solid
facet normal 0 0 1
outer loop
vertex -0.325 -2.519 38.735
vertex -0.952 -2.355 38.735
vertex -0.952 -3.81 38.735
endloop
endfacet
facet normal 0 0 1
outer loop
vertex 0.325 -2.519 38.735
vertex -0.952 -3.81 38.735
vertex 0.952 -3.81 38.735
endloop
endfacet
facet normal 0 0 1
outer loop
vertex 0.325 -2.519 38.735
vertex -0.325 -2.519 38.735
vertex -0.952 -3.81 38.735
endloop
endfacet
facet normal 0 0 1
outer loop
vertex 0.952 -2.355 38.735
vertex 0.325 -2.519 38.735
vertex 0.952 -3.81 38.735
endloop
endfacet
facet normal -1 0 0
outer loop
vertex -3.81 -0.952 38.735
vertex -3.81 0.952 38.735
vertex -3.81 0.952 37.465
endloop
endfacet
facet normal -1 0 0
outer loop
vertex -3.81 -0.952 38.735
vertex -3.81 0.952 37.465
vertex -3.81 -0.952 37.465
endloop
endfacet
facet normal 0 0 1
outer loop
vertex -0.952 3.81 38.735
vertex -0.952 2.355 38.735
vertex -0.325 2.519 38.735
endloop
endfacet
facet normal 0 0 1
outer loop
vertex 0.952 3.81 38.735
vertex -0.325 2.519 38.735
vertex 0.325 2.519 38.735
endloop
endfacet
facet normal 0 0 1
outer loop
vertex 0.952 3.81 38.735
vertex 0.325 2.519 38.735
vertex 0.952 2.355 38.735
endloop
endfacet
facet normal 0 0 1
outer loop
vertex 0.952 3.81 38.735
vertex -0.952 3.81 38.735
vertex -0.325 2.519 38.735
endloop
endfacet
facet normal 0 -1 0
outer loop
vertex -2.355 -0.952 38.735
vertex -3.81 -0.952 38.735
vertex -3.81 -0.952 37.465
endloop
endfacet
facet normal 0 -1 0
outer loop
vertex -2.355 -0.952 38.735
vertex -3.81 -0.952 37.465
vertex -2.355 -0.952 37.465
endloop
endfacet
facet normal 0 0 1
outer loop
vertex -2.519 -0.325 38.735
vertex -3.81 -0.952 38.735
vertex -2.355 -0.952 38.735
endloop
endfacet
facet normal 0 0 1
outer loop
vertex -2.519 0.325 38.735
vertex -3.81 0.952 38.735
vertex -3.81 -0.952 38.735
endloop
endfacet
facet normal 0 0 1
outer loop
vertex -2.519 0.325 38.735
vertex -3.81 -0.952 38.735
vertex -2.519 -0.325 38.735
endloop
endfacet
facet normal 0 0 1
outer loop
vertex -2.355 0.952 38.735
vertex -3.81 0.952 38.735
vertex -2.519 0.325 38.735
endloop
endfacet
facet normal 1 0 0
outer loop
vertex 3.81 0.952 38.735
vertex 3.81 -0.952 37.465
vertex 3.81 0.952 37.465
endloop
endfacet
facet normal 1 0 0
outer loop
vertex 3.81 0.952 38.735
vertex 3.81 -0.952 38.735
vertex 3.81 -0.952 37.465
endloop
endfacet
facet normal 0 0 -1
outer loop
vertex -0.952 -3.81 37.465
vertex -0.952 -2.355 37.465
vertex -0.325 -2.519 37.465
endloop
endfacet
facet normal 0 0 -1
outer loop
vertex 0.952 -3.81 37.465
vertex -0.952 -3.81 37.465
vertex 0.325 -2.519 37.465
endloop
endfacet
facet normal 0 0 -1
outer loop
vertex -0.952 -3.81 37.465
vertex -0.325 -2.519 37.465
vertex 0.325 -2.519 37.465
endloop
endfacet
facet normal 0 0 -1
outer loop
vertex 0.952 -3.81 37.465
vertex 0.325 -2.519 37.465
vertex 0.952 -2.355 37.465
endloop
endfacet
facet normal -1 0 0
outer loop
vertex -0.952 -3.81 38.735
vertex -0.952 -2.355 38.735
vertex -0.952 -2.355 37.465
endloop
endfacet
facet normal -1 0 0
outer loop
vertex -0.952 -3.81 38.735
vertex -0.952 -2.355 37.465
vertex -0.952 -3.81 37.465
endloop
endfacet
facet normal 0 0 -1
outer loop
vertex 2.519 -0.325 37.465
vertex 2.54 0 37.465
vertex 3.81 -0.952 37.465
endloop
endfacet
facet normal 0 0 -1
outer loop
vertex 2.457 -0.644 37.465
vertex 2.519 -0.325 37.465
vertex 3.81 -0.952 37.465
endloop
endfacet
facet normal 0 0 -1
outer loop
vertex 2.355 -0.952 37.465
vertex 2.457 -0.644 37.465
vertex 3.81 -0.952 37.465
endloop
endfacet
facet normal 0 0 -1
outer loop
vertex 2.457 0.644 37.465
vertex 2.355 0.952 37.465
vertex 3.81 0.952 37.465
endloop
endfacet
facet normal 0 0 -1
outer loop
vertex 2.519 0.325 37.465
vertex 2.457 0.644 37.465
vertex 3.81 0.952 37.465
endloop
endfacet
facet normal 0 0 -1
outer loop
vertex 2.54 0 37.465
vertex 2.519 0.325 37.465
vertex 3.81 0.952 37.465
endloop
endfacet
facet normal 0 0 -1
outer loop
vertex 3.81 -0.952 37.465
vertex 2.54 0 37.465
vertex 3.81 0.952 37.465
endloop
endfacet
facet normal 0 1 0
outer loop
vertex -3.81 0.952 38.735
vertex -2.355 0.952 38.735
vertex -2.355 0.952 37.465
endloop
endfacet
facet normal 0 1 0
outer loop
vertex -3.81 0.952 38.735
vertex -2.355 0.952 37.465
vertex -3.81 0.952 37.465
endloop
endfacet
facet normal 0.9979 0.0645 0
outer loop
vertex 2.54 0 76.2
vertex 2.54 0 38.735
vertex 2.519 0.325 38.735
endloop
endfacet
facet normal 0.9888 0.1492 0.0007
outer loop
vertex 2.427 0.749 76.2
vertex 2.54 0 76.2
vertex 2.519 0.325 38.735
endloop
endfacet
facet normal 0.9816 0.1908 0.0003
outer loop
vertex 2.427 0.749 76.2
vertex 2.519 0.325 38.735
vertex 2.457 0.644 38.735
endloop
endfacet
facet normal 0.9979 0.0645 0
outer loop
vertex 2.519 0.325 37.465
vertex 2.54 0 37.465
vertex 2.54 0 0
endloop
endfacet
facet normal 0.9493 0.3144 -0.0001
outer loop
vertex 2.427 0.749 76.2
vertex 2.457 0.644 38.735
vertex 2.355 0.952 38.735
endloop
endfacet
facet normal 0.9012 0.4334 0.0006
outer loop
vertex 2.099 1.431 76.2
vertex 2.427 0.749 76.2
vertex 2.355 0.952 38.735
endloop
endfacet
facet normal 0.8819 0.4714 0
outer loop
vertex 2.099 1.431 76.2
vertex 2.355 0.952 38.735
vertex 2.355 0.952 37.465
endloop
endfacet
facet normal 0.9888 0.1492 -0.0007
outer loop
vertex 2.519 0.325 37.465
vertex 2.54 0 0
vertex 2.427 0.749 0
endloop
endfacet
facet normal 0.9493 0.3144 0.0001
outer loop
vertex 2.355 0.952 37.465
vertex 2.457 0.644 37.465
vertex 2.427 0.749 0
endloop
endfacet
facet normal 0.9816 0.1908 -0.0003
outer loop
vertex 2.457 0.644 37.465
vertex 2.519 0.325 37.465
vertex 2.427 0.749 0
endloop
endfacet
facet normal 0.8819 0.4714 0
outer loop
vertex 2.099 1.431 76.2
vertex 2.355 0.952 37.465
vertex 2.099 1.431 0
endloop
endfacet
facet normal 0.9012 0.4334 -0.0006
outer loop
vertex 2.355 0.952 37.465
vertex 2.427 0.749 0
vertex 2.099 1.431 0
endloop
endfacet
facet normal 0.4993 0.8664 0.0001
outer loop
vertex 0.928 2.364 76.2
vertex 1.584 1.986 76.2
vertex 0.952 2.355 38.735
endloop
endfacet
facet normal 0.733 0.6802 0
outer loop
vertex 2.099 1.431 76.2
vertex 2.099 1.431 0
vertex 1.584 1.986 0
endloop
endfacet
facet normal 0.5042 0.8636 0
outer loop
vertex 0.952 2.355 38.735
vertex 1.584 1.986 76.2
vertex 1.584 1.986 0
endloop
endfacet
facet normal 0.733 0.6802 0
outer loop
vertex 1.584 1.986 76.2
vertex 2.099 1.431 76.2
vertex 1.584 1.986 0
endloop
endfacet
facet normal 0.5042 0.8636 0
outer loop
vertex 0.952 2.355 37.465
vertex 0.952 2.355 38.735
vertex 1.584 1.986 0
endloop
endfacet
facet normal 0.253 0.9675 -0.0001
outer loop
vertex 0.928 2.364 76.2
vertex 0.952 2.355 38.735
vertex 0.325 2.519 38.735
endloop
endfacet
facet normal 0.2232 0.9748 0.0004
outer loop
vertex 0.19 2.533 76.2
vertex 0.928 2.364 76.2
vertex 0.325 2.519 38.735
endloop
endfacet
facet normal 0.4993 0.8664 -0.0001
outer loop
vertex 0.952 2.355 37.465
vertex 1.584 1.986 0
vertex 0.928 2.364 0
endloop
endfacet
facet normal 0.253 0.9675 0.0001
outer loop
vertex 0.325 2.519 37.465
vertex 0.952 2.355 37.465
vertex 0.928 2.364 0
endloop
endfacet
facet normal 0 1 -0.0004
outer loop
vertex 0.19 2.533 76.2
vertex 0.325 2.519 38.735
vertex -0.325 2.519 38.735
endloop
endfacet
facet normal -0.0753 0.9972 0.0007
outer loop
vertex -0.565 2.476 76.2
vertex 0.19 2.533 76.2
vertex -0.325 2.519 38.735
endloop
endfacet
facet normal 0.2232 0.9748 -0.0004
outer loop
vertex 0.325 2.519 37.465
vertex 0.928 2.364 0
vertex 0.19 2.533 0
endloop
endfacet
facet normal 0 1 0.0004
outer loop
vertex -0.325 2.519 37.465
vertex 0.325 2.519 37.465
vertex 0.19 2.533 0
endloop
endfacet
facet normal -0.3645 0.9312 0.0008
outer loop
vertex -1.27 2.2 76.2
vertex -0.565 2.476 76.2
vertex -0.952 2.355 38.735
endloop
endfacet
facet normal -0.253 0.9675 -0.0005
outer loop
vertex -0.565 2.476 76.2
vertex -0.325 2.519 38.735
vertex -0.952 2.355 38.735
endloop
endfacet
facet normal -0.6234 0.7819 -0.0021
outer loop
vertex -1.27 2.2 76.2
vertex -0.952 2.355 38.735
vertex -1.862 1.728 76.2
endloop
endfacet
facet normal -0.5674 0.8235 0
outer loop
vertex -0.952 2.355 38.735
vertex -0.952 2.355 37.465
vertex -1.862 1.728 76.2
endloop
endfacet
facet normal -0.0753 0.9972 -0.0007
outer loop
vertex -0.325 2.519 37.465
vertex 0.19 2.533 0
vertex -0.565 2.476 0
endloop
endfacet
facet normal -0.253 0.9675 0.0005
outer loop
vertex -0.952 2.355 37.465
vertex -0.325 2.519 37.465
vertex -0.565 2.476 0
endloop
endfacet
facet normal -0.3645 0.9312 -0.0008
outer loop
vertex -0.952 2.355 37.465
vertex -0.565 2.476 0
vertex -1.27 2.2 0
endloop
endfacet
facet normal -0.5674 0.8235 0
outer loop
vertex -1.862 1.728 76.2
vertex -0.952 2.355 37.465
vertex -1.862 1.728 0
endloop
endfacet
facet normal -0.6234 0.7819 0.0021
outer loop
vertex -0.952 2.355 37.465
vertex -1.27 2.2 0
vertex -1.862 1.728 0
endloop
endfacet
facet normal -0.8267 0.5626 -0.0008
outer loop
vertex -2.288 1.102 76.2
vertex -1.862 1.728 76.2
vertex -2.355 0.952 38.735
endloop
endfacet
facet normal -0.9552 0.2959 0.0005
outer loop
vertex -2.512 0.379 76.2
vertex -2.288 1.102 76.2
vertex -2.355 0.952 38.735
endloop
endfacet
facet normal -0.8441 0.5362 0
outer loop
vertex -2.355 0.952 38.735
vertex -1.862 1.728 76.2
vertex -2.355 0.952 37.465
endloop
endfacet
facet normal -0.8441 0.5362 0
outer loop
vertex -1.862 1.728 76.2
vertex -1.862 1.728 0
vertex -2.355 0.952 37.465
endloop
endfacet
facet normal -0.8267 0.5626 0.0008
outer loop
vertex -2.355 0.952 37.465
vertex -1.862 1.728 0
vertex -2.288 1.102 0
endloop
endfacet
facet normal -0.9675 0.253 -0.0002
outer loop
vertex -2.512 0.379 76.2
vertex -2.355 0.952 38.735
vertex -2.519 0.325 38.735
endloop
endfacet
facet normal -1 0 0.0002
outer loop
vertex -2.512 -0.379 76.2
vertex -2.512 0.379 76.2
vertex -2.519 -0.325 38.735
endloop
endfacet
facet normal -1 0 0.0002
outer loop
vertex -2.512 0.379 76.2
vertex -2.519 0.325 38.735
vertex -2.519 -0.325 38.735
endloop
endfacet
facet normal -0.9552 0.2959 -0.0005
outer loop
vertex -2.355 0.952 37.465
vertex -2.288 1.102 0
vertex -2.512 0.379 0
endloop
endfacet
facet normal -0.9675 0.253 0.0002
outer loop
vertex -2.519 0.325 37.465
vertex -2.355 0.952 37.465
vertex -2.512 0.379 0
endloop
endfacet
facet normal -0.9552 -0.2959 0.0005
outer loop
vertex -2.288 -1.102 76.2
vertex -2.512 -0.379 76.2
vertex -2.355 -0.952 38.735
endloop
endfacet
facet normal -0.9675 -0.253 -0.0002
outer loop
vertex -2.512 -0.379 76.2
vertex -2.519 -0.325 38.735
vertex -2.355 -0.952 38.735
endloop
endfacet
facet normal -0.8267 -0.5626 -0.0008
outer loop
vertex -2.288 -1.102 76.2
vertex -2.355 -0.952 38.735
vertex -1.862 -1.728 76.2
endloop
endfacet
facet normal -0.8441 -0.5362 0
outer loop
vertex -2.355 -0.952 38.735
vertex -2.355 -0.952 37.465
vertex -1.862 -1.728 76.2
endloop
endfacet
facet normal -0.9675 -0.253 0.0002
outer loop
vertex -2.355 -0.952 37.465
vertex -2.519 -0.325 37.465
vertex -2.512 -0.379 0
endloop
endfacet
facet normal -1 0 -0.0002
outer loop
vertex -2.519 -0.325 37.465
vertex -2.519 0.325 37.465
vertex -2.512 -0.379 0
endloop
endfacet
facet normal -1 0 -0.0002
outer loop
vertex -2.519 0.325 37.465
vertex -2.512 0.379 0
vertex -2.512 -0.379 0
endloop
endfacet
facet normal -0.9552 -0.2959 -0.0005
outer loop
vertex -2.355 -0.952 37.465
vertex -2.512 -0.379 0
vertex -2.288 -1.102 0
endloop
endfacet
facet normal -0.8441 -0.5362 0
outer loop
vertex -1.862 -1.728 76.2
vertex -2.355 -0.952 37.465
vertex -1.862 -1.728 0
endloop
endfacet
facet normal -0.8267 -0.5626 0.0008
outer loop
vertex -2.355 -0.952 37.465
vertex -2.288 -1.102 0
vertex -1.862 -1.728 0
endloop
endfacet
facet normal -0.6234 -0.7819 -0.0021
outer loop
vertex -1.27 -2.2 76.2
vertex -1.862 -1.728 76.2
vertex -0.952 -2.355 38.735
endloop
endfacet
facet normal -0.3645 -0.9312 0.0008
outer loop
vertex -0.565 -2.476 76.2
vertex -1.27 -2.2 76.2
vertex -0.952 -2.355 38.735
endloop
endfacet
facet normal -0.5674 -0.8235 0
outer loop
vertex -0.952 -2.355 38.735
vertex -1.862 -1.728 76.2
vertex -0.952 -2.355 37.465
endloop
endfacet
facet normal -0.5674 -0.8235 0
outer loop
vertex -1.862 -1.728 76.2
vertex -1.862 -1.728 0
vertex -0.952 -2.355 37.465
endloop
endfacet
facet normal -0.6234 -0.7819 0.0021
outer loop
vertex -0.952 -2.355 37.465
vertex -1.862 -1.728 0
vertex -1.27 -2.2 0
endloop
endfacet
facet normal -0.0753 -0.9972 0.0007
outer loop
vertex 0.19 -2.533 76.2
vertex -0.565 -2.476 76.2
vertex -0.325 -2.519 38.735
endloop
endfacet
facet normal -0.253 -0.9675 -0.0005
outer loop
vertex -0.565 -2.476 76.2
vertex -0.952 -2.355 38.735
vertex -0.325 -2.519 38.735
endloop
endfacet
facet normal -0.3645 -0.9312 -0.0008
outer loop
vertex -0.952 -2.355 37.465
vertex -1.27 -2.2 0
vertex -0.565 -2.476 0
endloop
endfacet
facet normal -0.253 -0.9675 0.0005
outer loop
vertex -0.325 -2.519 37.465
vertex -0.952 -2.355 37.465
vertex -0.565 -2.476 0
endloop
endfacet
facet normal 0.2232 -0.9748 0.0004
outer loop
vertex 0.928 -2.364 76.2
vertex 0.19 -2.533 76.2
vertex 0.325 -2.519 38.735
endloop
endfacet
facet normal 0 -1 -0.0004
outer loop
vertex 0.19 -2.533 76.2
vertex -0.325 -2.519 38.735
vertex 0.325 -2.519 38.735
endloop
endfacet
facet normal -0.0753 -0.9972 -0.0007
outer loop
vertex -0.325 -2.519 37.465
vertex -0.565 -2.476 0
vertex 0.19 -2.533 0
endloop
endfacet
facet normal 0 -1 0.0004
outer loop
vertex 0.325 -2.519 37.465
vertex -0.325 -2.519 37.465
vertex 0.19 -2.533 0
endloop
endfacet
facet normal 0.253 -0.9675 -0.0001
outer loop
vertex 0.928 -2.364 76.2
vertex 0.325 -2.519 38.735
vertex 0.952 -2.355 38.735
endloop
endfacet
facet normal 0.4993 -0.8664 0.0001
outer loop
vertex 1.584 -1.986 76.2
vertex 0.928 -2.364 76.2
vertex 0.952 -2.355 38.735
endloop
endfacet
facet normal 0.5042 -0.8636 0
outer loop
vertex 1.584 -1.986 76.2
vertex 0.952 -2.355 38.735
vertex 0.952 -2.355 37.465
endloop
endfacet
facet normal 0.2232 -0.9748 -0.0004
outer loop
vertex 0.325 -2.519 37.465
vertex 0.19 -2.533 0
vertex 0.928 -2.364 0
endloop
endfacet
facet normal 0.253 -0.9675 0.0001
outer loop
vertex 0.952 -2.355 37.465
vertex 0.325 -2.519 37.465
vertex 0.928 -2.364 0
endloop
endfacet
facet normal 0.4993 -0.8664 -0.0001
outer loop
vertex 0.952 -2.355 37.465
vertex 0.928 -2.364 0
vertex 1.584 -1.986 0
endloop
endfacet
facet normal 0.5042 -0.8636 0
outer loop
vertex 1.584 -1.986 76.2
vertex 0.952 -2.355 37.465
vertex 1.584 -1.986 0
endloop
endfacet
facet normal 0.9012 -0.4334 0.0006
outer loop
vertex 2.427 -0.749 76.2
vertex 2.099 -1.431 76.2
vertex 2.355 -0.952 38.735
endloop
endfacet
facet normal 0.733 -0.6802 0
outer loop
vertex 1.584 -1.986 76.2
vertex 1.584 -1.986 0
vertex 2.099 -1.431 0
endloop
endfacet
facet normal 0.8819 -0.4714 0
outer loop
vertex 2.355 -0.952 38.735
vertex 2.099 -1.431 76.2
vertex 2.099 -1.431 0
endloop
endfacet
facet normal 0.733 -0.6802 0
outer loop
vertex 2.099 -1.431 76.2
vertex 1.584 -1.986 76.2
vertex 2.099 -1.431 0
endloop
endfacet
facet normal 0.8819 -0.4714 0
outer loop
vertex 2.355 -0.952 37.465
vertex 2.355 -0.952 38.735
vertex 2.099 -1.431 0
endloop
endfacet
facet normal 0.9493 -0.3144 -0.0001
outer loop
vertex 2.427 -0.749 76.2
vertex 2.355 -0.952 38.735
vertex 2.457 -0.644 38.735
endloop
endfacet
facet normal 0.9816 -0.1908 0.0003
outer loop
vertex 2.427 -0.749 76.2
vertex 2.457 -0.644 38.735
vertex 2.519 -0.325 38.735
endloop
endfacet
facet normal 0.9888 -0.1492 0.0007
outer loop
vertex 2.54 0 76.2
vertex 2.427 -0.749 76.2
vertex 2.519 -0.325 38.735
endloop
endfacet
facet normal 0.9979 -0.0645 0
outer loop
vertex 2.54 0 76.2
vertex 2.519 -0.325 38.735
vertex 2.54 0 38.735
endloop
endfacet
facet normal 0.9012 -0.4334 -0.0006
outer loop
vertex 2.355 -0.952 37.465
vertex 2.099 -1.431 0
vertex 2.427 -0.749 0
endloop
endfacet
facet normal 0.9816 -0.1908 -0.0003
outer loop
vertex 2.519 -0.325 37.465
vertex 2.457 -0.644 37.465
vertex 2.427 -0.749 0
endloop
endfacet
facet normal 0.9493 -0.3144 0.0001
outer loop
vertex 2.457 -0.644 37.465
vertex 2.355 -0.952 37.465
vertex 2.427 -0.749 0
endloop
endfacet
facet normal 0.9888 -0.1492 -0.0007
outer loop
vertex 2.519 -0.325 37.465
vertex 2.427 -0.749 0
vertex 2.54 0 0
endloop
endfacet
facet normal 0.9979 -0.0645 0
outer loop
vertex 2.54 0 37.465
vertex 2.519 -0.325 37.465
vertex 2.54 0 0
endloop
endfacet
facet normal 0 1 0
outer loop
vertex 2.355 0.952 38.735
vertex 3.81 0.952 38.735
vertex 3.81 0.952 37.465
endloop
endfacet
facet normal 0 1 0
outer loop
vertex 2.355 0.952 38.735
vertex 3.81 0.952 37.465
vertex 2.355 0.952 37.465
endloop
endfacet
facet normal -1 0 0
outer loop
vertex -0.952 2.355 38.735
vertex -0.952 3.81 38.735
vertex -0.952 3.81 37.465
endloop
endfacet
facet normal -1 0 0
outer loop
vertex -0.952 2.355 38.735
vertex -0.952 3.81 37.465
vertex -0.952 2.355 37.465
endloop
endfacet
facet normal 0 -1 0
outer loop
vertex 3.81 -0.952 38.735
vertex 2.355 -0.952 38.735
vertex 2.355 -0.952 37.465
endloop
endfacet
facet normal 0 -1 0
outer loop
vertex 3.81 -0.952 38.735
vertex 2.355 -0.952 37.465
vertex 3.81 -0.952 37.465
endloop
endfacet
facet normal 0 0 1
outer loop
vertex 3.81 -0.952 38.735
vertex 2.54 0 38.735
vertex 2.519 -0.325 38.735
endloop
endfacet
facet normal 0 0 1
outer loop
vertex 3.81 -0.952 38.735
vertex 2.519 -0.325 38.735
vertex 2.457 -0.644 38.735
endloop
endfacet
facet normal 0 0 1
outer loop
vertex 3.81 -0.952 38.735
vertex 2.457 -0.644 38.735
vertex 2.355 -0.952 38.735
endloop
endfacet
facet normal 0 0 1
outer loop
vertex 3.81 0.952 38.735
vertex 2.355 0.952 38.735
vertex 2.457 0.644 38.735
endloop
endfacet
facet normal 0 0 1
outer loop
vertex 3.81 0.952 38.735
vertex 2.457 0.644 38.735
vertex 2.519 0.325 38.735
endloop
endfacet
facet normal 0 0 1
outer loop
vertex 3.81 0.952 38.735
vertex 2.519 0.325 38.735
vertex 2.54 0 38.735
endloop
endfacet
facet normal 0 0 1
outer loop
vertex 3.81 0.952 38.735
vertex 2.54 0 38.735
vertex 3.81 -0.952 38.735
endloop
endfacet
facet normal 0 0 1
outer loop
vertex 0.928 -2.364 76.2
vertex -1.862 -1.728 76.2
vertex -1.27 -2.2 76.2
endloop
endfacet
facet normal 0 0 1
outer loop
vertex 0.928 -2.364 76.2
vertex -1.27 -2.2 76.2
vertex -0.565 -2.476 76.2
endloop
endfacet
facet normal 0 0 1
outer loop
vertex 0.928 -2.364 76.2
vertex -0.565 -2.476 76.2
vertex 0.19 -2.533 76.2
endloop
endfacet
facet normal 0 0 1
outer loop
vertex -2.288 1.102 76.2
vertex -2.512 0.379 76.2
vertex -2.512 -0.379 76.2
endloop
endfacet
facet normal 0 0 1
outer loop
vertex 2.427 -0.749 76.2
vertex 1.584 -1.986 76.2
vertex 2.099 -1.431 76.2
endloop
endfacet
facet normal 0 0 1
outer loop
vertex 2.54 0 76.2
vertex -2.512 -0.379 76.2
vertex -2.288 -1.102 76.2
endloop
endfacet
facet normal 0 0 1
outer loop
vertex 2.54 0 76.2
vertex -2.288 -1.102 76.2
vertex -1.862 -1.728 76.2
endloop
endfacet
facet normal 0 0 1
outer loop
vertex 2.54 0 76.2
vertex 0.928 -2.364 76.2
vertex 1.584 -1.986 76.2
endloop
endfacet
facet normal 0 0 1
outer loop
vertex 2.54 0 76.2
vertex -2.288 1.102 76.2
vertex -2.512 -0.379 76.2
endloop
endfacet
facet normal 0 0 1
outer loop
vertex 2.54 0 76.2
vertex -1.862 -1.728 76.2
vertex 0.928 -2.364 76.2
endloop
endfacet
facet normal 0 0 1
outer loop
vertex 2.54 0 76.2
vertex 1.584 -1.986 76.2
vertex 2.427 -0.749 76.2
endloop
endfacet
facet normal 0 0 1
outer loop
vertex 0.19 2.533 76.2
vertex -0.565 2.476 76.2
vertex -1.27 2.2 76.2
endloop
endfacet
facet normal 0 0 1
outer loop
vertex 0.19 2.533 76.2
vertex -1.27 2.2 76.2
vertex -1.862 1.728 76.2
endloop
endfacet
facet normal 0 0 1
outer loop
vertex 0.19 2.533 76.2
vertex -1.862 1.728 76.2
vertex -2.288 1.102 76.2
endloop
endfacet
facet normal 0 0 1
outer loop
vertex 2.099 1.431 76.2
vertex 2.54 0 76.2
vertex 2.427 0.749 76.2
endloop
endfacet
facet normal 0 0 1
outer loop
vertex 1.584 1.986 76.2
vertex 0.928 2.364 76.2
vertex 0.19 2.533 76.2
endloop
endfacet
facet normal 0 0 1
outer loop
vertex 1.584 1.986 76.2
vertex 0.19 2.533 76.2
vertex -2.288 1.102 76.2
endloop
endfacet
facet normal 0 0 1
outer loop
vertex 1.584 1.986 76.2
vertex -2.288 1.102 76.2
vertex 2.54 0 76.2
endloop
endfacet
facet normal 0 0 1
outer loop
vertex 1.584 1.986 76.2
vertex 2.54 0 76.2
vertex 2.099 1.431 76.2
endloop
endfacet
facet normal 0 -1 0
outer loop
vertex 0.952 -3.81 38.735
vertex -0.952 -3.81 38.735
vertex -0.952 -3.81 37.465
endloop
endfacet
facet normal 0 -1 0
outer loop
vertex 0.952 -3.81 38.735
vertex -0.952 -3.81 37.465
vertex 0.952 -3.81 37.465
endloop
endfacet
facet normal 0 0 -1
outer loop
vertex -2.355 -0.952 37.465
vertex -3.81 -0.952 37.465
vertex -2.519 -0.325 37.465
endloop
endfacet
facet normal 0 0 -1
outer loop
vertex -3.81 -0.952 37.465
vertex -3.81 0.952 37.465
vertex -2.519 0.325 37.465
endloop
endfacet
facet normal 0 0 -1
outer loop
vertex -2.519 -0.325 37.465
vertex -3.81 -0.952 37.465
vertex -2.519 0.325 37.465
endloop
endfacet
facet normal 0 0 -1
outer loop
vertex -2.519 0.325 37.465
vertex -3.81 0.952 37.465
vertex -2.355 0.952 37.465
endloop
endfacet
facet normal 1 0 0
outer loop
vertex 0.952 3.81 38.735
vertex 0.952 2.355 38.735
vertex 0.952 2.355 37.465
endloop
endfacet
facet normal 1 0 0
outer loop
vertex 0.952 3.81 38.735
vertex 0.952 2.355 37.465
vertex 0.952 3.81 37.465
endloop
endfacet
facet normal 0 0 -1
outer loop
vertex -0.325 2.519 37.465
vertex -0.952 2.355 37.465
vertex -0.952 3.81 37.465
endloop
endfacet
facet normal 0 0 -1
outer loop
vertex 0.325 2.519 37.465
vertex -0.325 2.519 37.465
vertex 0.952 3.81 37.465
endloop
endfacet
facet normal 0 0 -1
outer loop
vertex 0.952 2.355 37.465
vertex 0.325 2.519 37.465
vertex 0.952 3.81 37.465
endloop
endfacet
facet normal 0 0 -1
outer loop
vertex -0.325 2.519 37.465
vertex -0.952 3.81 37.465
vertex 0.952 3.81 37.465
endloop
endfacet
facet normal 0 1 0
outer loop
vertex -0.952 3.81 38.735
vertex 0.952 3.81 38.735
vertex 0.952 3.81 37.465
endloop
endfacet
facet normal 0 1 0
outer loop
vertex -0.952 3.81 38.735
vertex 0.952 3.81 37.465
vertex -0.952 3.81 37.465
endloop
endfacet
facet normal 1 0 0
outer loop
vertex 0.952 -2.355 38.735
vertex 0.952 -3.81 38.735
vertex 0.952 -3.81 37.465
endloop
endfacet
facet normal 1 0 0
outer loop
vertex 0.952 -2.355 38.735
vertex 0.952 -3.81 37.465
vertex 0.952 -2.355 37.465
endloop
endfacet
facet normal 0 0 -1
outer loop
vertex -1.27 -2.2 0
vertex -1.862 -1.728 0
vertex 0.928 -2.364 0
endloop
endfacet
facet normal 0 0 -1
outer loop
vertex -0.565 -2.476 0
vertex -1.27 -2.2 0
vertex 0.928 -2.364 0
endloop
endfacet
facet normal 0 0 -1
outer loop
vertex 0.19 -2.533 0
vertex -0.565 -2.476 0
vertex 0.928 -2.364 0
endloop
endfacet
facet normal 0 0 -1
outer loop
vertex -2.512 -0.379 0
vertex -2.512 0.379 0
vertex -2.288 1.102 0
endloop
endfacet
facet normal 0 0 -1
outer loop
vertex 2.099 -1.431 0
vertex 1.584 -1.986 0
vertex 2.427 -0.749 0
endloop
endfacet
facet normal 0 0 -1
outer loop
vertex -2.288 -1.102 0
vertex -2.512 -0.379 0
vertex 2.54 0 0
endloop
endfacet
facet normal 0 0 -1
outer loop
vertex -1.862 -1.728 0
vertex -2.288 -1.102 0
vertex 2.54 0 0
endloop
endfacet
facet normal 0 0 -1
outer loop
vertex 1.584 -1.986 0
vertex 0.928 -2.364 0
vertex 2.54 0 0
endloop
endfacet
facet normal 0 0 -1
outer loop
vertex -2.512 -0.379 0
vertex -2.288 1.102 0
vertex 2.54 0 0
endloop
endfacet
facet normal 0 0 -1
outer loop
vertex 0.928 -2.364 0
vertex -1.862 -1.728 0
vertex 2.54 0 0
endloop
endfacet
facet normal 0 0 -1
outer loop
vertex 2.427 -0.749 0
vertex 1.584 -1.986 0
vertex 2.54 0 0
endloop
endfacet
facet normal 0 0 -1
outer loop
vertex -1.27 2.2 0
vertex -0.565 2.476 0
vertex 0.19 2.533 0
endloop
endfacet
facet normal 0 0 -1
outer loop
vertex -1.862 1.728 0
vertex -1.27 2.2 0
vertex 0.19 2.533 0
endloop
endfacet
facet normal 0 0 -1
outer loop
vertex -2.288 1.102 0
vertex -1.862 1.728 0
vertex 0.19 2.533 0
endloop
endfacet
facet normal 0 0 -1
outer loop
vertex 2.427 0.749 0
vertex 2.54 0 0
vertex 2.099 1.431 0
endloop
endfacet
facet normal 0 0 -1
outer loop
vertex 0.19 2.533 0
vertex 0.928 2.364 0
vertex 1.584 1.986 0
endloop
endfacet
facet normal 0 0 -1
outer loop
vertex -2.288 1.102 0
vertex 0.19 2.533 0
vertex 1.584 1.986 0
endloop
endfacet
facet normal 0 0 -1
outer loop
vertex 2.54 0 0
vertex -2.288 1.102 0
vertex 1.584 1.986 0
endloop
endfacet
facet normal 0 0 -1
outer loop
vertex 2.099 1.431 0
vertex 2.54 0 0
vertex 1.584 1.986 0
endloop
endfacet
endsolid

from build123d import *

# Parameters (mm, degrees)
F0_R     = 2.54
F1_DEPTH = 76.2
F4_DEPTH = 0.635


with BuildPart() as f1:
    # F0 (on Top) → F1 (new body)
    with BuildSketch(Plane.XY):
        Circle(F0_R)
    extrude(amount=F1_DEPTH)

    # F3 (on offset) → F4 (join, symmetric)
    with BuildSketch(Plane.XY.offset(38.1)):
        Polygon((0.9525, 0.9525), (0.9525, 3.81), (-0.9525, 3.81), (-0.9525, 0.9525), (-3.81, 0.9525), (-3.81, -0.9525), (-0.9525, -0.9525), (-0.9525, -3.81), (0.9525, -3.81), (0.9525, -0.9525), (3.81, -0.9525), (3.81, 0.9525), align=None)
    extrude(amount=F4_DEPTH, both=True)


solid = f1.part
